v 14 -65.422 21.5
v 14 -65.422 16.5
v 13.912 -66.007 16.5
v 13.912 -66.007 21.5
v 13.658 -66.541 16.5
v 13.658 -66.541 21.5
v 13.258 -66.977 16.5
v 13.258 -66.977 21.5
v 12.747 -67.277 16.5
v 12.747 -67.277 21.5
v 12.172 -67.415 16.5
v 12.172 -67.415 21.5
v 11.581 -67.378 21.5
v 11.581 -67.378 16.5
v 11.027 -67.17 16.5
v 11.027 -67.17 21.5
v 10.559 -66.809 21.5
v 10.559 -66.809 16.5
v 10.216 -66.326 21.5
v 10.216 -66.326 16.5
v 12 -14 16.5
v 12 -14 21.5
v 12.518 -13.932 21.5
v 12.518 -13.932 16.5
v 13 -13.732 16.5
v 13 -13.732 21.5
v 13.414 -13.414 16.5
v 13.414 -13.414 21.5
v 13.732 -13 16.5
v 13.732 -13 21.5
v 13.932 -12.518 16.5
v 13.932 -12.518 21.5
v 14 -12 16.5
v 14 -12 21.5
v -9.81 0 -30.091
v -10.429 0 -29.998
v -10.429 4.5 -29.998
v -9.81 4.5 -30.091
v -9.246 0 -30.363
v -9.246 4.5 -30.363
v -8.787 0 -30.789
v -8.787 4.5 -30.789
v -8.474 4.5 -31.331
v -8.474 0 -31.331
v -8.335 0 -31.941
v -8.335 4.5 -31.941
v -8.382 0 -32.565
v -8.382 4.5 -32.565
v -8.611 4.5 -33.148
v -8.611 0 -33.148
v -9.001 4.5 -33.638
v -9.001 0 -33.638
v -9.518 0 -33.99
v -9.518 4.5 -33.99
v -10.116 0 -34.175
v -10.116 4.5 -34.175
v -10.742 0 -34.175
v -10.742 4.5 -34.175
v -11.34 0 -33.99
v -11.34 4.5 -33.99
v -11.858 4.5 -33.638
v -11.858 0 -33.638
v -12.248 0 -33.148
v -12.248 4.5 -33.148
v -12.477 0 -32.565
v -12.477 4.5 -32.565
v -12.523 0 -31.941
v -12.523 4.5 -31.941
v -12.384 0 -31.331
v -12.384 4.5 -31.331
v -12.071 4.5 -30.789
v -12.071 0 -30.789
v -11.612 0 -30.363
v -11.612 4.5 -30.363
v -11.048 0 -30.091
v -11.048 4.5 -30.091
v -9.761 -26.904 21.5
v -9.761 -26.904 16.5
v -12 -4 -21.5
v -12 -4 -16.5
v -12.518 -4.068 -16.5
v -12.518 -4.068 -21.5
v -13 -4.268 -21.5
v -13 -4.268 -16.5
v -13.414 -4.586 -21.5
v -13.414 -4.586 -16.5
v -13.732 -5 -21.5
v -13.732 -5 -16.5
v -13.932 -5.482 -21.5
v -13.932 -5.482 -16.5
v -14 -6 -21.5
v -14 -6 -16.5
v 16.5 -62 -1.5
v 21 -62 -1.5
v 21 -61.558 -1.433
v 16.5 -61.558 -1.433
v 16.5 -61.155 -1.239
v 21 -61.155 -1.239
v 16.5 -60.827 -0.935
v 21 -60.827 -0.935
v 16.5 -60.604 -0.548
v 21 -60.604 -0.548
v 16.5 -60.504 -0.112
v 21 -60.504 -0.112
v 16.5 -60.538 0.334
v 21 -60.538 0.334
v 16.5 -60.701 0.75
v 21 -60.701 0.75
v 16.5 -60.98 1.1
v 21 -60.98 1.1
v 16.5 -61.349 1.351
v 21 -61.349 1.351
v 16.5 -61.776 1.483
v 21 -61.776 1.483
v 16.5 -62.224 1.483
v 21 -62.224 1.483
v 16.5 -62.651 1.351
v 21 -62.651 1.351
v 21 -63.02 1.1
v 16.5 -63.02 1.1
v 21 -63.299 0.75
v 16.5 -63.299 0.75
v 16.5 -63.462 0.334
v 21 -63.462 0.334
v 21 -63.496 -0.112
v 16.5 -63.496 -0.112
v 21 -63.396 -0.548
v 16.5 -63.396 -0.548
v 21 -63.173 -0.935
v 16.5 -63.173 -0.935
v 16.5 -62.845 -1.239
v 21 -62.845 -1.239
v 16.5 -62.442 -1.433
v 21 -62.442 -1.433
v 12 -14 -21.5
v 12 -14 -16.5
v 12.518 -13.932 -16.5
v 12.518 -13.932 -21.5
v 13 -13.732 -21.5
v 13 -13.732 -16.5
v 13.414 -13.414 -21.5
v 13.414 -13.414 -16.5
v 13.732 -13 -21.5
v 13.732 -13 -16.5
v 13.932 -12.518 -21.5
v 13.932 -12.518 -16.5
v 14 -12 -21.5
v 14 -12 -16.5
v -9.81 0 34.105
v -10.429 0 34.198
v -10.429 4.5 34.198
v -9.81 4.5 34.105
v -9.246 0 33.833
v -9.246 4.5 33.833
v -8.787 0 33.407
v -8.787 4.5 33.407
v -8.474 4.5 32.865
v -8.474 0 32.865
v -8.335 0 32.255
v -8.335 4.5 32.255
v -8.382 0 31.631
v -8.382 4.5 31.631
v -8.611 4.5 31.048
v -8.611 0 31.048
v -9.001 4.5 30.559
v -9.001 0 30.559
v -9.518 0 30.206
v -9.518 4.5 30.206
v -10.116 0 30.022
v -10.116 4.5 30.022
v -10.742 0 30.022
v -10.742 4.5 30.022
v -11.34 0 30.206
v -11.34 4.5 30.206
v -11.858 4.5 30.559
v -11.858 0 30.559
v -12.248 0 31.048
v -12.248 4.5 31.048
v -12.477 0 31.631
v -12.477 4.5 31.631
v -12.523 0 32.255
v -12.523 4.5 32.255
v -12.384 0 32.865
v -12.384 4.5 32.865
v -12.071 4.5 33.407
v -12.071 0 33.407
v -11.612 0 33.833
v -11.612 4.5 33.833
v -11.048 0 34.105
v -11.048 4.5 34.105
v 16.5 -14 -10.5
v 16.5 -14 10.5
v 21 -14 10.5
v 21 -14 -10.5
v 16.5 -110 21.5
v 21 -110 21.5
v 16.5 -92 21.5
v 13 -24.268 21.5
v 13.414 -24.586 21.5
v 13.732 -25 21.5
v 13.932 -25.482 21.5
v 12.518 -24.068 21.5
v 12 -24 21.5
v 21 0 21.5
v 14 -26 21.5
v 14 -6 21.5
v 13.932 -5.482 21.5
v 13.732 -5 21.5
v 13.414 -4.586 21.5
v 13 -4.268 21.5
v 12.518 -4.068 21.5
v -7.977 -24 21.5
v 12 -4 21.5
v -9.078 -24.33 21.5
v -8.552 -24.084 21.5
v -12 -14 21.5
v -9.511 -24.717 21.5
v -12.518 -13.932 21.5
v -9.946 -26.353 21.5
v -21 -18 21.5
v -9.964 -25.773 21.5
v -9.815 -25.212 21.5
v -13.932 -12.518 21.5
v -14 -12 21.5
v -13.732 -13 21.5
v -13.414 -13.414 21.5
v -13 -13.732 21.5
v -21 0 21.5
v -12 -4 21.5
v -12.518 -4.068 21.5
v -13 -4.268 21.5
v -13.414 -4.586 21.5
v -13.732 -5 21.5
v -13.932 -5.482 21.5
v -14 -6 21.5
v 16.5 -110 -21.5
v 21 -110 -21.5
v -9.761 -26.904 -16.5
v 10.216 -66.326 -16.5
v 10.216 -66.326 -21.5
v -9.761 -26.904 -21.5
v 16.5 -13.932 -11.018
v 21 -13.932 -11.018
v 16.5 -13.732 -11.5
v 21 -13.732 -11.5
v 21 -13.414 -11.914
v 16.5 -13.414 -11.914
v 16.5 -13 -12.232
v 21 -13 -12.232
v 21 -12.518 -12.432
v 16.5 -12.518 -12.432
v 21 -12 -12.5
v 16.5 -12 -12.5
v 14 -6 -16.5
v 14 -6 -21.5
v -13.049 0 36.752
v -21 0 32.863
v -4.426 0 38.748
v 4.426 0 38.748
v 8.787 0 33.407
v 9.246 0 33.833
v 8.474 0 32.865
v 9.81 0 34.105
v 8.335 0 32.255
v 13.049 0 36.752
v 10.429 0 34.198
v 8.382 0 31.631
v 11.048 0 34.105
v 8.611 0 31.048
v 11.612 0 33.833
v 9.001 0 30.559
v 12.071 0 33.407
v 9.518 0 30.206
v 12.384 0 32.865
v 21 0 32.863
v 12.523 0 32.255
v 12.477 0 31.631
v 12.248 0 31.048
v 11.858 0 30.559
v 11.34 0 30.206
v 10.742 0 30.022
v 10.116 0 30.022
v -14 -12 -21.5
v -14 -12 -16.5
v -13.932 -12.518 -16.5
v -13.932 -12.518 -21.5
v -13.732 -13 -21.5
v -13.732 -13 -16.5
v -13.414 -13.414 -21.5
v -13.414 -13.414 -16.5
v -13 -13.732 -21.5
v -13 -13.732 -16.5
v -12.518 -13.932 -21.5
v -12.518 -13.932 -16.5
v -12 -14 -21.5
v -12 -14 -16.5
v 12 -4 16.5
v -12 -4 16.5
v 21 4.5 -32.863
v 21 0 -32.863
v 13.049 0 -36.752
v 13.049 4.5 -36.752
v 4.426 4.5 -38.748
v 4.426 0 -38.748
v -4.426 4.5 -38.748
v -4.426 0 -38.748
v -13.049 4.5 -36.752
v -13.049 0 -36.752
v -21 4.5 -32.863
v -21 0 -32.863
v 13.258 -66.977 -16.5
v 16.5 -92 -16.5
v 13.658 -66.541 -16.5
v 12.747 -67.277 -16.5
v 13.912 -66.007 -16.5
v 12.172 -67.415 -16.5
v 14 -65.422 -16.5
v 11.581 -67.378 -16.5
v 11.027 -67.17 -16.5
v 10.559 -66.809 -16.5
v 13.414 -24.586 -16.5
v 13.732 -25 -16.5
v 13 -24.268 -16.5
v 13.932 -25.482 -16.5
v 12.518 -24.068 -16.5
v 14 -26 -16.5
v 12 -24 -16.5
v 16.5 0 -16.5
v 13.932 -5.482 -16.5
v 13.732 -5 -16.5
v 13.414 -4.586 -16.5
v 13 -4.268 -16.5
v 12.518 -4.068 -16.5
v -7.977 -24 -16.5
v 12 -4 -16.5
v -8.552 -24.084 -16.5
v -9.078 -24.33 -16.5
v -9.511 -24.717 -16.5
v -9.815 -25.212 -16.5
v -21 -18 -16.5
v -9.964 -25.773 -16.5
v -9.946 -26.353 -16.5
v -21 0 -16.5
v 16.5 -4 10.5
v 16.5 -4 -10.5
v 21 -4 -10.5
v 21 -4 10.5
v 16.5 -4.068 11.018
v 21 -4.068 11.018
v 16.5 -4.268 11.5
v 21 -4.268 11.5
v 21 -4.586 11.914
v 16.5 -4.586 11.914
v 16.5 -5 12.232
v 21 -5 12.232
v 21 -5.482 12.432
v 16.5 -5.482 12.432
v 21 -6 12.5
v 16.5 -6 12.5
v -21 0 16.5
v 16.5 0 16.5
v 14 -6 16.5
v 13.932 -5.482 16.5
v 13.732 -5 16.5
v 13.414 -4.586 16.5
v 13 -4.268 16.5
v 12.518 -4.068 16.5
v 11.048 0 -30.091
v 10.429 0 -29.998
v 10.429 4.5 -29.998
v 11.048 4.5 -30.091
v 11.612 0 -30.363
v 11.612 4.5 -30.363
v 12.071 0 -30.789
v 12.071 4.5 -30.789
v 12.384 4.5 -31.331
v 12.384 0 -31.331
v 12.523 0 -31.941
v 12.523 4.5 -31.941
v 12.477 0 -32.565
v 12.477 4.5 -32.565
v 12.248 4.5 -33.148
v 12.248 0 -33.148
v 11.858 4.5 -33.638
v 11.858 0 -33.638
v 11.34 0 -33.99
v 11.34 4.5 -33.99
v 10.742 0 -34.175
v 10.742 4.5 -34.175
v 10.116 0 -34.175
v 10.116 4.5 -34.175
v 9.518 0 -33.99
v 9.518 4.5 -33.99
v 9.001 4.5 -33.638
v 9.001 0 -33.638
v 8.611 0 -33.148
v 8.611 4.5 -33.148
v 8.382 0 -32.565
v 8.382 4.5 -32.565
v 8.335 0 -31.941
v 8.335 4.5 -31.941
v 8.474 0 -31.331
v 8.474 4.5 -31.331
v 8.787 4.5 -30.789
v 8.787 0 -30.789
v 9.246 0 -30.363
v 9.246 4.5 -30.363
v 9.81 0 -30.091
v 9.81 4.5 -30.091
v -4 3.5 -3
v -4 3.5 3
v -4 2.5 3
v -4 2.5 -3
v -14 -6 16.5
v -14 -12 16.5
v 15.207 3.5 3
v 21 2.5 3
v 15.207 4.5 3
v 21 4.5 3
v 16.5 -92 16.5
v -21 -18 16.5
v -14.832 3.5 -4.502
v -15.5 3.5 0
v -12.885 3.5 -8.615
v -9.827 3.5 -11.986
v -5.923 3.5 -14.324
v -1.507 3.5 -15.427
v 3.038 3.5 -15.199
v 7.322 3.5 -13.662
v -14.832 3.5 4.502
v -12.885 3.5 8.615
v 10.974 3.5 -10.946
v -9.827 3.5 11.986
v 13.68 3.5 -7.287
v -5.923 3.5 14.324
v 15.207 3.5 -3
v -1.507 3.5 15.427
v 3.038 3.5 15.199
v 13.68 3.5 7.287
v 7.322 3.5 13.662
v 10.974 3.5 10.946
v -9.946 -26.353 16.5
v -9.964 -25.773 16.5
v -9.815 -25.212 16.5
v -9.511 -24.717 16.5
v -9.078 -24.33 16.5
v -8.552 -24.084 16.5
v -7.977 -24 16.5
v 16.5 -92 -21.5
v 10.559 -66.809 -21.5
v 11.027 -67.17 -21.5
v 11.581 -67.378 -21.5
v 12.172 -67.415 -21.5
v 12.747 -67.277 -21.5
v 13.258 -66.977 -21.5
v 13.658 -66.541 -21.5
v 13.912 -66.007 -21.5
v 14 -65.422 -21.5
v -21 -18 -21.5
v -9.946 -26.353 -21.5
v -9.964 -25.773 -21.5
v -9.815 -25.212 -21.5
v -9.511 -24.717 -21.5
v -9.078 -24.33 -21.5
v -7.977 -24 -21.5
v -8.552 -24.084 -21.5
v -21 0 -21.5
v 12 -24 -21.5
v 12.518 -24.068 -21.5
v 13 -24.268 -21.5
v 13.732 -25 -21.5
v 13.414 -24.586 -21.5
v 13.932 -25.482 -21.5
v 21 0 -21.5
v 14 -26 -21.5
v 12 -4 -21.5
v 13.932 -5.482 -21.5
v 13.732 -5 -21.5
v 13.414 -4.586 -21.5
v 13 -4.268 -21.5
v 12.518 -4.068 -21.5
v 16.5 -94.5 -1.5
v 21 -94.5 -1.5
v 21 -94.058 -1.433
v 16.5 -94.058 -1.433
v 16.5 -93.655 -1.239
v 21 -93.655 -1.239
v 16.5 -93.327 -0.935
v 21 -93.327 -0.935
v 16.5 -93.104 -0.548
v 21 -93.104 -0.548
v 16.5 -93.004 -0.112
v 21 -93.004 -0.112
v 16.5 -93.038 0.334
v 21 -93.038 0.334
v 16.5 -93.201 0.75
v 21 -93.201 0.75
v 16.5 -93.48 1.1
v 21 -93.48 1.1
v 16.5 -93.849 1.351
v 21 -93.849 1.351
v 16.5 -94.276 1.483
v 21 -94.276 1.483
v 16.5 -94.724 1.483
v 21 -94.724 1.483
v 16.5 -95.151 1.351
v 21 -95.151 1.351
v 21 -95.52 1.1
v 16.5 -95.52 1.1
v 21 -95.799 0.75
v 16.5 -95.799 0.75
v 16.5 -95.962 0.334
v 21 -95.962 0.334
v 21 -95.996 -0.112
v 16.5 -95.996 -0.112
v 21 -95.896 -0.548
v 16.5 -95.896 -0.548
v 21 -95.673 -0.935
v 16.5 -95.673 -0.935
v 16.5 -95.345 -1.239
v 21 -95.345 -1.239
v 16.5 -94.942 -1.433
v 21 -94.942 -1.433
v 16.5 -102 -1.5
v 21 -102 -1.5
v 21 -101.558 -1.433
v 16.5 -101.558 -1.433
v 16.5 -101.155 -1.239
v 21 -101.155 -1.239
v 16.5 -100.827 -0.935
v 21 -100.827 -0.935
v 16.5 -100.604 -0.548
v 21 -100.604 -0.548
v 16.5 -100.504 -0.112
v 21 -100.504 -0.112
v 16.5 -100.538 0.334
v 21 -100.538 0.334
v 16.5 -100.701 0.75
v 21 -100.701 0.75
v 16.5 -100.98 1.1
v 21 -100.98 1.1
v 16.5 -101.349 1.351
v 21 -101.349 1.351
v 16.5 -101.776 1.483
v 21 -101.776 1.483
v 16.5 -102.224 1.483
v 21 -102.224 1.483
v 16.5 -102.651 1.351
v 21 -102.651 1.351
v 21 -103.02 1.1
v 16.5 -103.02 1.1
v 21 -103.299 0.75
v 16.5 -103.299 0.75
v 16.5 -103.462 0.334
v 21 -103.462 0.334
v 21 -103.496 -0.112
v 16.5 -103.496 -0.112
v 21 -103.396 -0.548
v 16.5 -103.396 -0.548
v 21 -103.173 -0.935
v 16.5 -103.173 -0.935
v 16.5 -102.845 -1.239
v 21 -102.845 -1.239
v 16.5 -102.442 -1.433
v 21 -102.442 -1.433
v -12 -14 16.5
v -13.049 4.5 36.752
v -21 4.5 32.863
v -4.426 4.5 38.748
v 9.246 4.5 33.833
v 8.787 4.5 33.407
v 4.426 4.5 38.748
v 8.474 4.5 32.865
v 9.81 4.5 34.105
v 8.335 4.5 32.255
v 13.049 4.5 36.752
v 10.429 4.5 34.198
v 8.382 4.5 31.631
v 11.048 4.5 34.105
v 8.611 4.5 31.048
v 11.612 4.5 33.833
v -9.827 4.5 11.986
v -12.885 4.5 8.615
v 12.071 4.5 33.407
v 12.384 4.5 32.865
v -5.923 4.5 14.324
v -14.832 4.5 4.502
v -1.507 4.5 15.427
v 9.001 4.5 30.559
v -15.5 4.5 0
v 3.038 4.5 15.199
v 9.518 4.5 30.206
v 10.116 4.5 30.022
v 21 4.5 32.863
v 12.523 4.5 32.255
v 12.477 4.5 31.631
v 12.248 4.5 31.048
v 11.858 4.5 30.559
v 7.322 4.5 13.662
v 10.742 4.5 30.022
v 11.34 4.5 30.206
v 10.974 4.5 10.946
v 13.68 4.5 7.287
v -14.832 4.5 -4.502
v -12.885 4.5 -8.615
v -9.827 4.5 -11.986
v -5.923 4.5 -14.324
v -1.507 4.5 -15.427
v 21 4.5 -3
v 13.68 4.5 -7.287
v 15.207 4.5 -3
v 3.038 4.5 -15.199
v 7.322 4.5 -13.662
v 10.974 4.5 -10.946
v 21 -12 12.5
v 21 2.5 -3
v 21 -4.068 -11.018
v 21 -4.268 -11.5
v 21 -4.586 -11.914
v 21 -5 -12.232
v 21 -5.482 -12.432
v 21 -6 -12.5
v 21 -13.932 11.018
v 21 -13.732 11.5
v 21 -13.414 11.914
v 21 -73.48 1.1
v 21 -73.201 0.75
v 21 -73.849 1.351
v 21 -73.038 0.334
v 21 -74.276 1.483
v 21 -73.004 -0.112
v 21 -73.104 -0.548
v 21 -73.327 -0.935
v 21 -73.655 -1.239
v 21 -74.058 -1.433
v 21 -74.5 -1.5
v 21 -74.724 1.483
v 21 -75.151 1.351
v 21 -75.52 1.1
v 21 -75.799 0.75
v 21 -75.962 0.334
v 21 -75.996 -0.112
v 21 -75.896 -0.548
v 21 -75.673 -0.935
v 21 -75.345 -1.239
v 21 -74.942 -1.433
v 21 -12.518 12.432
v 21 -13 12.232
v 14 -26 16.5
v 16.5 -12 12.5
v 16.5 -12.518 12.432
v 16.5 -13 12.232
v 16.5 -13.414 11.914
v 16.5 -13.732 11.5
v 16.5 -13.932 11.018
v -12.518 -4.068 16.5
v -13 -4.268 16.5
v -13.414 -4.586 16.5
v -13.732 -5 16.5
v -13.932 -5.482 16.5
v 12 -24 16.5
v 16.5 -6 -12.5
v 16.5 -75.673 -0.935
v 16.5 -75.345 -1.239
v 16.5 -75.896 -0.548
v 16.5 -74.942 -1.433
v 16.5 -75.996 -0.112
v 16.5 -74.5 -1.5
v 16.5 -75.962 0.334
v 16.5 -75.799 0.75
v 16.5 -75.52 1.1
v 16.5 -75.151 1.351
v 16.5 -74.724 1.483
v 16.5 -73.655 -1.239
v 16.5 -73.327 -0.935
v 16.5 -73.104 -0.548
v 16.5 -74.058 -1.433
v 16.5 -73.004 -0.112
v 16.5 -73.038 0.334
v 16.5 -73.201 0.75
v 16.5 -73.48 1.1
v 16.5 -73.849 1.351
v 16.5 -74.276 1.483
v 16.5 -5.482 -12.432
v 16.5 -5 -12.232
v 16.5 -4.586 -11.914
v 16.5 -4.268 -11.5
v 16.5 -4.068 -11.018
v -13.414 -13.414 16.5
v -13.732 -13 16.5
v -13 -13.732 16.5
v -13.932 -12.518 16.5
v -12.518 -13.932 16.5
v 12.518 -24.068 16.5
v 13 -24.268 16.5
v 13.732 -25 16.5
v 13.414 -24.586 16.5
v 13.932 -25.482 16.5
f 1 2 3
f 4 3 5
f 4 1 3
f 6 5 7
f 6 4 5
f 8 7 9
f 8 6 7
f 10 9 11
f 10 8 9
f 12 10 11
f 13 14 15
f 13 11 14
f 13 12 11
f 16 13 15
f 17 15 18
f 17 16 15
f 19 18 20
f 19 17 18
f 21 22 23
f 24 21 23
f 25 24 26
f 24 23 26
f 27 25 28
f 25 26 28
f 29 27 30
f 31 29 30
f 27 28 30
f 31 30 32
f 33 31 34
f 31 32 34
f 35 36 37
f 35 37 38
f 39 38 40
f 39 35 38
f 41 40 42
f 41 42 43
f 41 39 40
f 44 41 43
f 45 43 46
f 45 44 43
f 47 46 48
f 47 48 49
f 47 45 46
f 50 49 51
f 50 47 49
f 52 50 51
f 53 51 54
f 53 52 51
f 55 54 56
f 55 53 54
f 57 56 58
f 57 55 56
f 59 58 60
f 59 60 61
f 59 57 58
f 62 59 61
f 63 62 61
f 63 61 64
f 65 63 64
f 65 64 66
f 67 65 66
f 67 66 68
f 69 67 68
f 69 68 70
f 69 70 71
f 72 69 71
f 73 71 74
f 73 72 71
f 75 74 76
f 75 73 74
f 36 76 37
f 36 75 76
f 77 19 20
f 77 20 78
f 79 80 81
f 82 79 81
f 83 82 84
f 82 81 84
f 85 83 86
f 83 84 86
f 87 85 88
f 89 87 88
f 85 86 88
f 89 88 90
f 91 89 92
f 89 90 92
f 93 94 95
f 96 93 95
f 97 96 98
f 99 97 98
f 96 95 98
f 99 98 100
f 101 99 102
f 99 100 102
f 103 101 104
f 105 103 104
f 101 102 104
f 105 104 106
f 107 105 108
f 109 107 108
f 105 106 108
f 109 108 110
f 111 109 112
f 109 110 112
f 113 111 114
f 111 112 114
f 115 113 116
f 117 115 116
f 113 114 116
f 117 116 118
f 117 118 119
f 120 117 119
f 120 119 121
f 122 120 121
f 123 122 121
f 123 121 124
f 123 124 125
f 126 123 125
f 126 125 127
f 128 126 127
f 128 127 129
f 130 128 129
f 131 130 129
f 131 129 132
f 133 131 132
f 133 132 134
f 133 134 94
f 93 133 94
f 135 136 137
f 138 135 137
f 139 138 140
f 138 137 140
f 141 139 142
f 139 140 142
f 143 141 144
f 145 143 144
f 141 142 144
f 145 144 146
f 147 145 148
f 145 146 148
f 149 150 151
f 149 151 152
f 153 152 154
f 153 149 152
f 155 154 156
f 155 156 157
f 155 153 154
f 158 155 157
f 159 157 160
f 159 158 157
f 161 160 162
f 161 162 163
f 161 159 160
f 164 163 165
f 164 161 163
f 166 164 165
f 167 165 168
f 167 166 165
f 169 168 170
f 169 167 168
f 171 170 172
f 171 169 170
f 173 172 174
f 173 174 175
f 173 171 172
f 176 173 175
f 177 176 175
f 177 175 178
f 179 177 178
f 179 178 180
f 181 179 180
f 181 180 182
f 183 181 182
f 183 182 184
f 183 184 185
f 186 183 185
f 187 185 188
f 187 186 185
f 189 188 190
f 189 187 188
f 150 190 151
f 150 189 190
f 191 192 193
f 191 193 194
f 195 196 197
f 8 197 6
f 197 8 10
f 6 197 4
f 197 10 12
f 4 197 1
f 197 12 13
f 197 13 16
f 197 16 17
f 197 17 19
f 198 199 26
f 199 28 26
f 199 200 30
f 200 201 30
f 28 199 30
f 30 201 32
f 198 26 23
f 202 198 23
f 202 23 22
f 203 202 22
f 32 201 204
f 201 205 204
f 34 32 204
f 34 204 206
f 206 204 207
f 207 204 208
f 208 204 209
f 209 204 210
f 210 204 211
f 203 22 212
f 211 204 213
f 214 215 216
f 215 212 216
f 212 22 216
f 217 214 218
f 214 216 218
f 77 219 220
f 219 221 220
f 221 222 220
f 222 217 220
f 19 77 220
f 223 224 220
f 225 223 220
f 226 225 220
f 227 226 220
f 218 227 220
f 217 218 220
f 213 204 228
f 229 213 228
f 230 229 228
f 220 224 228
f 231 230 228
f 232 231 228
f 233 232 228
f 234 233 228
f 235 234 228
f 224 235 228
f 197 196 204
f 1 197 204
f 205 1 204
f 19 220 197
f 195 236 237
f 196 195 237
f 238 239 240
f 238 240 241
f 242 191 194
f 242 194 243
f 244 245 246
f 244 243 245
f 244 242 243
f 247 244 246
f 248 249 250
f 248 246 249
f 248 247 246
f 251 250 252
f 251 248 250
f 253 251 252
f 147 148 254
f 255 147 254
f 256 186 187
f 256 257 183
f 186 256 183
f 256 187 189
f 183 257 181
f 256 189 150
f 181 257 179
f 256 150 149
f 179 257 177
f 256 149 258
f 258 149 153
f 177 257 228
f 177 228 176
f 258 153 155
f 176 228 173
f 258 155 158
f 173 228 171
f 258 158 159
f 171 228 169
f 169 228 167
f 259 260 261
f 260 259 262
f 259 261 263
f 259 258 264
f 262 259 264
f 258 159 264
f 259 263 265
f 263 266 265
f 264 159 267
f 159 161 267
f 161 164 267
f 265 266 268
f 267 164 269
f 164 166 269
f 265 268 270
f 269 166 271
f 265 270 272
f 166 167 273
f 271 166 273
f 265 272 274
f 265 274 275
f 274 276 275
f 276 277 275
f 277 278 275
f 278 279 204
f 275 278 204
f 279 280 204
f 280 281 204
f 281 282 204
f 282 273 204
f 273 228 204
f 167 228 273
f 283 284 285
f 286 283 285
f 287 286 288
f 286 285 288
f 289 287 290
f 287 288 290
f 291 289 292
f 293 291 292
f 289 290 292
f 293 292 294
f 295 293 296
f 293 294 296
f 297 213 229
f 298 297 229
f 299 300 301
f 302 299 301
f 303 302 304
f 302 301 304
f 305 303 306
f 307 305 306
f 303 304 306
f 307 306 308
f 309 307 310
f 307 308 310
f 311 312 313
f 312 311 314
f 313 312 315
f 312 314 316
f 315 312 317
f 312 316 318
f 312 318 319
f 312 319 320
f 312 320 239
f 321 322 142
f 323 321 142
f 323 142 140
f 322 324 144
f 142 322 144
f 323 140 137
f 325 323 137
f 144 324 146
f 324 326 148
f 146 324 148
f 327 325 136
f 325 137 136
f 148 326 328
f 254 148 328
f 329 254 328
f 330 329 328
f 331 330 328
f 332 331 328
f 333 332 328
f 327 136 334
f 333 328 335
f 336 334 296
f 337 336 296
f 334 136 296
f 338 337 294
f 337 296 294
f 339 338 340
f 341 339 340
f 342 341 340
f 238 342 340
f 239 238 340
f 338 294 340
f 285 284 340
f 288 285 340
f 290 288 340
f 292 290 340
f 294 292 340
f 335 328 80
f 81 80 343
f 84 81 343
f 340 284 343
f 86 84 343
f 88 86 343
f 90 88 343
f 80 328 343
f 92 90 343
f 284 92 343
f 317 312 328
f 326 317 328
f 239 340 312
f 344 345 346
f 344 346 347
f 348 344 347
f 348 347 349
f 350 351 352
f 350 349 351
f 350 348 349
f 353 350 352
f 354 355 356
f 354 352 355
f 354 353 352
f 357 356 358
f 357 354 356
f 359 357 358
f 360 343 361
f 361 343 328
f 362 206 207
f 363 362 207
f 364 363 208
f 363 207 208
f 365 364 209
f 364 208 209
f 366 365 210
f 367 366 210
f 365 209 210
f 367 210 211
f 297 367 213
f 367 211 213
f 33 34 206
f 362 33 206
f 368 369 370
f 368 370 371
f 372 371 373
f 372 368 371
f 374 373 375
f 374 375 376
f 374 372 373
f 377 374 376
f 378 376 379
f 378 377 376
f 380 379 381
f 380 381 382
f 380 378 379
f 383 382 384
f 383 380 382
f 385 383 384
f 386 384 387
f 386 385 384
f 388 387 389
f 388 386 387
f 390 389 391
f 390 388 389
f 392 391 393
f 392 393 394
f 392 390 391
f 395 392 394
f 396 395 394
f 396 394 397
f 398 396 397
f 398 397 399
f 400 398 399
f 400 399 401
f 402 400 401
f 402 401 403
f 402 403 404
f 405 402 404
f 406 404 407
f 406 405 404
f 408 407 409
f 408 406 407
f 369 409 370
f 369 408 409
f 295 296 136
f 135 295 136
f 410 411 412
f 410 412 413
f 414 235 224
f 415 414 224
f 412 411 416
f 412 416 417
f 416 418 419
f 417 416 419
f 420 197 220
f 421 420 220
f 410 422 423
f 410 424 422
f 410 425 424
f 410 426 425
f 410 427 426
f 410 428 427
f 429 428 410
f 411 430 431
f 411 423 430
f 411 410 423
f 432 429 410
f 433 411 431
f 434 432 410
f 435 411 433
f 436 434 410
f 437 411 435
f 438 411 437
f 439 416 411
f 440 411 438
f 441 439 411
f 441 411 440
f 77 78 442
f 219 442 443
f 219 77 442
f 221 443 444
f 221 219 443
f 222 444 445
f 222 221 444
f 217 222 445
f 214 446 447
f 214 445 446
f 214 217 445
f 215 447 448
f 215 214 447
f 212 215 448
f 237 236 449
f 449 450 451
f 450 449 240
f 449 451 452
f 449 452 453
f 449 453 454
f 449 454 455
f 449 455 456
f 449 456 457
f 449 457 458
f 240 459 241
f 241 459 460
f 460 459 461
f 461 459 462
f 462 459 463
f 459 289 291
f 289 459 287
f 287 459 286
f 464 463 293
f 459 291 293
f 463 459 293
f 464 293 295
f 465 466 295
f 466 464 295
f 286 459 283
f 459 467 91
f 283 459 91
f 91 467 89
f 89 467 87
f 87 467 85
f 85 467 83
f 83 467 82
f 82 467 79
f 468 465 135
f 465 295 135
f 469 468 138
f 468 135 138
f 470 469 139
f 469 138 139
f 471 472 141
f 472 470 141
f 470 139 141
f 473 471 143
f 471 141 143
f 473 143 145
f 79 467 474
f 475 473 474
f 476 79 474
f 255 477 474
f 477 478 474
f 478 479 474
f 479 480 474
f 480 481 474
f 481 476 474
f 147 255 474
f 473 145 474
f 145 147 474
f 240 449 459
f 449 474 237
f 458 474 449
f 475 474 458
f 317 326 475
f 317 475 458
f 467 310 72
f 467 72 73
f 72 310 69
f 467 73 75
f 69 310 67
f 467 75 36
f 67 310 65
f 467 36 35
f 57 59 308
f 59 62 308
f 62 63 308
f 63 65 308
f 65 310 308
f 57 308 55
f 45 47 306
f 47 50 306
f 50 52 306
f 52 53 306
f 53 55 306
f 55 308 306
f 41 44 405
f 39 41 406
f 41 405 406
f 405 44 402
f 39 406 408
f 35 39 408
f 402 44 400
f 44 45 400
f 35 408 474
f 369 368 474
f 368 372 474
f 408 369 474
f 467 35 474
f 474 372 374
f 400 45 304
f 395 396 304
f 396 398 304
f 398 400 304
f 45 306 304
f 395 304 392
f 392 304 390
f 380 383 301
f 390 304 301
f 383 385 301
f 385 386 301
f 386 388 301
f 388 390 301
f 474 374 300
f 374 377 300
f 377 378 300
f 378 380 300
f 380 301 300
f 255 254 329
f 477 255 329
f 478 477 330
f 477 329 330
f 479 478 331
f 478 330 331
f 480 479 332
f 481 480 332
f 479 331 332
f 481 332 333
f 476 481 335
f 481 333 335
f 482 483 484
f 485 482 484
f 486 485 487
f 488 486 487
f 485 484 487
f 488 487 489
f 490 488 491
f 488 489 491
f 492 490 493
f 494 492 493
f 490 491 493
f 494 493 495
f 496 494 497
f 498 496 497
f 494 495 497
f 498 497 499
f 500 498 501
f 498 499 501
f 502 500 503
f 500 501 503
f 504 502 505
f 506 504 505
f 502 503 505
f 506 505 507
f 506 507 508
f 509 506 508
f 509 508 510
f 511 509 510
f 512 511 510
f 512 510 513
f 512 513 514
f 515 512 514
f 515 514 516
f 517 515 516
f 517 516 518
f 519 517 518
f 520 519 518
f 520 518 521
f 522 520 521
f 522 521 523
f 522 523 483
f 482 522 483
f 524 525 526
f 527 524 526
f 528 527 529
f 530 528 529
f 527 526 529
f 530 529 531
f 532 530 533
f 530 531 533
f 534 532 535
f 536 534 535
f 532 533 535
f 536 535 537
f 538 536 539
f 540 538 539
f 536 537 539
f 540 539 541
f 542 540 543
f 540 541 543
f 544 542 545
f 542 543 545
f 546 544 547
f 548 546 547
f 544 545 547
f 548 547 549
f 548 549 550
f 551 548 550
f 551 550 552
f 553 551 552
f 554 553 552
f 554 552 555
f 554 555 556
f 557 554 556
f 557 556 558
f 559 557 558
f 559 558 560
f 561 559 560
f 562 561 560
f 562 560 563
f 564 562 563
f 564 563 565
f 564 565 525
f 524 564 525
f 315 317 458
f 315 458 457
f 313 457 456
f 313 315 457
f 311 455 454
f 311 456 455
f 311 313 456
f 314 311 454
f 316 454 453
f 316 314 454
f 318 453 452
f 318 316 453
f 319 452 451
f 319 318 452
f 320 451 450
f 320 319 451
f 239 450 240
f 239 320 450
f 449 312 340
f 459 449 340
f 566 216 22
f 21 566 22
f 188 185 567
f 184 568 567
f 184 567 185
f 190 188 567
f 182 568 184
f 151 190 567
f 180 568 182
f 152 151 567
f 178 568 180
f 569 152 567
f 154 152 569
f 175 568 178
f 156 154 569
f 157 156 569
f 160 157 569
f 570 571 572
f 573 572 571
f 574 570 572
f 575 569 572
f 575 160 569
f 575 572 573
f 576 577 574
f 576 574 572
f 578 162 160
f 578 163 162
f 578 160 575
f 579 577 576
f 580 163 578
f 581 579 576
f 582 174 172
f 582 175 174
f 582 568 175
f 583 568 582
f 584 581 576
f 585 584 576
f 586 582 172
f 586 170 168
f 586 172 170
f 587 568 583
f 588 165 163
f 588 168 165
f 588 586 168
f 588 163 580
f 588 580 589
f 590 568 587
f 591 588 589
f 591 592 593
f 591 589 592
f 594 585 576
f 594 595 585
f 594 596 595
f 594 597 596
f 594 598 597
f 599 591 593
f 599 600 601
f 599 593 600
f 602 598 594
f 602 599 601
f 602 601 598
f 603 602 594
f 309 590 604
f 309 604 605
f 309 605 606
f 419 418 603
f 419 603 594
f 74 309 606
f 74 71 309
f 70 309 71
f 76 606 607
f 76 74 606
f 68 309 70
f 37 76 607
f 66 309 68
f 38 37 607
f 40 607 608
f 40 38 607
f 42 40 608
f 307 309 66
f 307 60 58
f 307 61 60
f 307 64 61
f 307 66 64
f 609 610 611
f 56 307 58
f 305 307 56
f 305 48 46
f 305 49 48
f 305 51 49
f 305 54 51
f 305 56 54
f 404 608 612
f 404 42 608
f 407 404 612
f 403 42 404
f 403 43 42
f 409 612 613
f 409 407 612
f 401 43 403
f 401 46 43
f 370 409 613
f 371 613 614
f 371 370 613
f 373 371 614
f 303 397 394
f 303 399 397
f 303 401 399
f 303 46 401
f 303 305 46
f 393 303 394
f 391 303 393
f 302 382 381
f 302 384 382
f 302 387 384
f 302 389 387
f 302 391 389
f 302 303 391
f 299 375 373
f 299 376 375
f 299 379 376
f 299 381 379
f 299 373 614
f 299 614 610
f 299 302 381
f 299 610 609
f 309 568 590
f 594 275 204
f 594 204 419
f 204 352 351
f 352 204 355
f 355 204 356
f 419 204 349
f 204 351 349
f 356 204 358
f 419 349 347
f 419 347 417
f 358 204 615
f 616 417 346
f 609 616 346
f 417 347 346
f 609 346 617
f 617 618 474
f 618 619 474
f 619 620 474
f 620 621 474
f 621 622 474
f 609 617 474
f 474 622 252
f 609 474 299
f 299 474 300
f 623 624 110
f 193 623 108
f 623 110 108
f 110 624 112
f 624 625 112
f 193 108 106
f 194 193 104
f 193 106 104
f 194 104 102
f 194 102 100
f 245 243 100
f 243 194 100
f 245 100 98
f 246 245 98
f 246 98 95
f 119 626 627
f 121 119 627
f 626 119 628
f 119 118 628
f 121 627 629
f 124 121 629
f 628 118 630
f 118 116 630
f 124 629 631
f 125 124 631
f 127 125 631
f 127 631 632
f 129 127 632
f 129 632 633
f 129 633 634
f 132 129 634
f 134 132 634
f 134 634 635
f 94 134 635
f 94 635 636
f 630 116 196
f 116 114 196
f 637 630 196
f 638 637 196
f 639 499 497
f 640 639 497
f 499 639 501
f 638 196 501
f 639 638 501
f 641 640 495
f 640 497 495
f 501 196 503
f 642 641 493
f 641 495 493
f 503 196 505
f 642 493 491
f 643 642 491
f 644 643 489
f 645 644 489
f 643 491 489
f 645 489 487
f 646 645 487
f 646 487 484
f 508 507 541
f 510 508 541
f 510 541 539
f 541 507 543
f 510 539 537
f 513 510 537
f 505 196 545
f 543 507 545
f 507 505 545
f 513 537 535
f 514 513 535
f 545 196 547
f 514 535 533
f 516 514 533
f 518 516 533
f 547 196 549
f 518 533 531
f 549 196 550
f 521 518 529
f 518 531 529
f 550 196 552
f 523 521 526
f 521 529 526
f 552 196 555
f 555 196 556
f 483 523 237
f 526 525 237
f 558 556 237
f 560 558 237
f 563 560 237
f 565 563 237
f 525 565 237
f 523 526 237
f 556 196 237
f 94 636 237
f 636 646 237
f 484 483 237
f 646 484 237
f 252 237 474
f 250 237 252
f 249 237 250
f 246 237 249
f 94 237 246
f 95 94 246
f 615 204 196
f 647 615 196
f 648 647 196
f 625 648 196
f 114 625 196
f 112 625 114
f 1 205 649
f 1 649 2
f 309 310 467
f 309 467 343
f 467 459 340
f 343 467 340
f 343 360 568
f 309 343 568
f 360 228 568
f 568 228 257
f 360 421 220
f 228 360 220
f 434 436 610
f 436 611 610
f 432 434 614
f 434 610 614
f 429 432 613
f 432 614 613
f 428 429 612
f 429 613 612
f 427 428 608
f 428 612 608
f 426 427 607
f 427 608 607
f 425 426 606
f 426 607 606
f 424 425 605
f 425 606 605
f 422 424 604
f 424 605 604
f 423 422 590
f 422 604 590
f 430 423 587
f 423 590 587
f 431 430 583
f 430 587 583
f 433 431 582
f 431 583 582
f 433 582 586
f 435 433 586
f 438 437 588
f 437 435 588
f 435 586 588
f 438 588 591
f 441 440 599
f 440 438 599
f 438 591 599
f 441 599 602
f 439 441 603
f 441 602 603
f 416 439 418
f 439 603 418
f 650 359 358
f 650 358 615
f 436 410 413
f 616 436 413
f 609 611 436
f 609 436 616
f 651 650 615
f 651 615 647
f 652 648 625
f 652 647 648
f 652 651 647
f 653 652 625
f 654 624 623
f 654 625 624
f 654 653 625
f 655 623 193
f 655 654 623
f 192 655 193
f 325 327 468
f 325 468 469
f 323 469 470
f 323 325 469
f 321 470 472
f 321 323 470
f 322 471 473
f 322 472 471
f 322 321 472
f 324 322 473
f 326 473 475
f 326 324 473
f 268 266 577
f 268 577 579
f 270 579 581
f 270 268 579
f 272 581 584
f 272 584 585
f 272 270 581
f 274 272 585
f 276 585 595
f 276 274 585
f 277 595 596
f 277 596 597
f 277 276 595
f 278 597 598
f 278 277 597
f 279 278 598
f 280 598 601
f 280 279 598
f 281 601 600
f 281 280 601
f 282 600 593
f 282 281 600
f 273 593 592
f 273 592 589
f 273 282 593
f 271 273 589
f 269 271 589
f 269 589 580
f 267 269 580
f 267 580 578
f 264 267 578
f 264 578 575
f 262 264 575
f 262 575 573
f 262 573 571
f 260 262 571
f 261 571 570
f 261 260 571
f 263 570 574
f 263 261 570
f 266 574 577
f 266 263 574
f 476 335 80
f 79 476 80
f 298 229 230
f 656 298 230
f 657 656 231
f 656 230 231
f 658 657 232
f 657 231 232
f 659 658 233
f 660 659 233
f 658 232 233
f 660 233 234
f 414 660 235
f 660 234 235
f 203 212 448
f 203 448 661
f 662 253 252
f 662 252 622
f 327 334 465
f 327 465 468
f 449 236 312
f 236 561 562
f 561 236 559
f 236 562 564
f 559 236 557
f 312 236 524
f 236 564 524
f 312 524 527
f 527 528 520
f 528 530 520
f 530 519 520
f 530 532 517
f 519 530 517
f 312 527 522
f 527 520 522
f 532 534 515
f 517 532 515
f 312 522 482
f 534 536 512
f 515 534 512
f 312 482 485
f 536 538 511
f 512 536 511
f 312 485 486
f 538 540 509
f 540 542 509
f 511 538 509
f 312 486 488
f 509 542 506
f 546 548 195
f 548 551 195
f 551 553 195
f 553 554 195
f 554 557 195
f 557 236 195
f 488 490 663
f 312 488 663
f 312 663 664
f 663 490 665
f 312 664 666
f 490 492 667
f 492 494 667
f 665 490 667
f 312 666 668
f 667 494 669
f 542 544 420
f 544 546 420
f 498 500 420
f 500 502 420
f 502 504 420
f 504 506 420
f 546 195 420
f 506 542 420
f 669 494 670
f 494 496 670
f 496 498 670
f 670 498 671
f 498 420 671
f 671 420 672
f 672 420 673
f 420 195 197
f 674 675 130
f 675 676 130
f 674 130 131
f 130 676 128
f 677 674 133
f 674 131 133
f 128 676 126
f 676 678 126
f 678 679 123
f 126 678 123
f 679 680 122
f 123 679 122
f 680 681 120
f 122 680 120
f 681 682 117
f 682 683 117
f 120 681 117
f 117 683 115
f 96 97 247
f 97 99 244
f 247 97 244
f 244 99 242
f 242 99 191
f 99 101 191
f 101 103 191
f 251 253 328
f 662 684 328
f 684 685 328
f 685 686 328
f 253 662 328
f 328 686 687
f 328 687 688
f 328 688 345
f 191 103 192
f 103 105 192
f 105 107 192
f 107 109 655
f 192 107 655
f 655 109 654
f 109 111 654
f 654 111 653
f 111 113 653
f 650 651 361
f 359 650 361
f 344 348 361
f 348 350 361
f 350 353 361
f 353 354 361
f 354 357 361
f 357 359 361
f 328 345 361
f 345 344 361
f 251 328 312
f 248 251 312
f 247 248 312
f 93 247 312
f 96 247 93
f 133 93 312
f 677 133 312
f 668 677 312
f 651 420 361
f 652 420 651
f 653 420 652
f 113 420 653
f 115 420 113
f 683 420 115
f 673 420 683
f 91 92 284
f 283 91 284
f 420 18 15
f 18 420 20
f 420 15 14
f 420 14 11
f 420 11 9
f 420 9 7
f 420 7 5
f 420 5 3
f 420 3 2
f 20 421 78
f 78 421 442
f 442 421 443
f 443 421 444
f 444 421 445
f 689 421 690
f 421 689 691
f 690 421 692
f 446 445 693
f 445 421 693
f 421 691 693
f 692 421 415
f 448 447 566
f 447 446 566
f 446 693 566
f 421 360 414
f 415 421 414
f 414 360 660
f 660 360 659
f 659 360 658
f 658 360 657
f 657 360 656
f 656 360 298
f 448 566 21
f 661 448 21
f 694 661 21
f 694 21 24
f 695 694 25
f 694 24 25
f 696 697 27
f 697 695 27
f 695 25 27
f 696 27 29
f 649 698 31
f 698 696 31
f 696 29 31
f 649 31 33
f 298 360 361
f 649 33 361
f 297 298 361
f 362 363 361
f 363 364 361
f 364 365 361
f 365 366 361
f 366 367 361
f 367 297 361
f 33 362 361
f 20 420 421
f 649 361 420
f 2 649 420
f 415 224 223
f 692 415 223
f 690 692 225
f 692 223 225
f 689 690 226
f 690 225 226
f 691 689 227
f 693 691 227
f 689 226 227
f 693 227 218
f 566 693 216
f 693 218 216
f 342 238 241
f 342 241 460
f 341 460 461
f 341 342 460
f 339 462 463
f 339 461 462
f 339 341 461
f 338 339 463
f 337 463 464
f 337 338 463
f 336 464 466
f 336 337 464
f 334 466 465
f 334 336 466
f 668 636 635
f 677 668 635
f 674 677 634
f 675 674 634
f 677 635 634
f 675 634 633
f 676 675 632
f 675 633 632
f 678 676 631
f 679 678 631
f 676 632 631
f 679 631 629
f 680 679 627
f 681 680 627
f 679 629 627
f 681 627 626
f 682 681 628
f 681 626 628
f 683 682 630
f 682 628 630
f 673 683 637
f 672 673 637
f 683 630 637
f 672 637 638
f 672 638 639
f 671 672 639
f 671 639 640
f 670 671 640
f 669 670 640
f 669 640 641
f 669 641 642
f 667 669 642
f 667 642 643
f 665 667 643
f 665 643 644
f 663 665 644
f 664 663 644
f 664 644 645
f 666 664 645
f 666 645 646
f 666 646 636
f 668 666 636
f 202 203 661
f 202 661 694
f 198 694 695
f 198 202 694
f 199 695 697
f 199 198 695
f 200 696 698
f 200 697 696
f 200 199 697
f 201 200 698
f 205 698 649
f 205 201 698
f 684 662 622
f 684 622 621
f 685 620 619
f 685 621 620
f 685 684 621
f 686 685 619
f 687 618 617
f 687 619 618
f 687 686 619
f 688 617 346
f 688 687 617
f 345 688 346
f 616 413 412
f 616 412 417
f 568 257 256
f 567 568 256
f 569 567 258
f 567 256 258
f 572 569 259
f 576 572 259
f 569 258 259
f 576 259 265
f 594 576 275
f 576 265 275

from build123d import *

# Parameters (mm, degrees)
SKETCH1_R           = 2.1
BOSS_EXTRUDE1_DEPTH = 4.5
SKETCH2_R           = 15.5
CUT_EXTRUDE1_DEPTH  = 1
SKETCH3_W           = 25
SKETCH3_H           = 6
CUT_EXTRUDE2_DEPTH  = 2
BOSS_EXTRUDE2_DEPTH = 110
CUT_EXTRUDE3_DEPTH  = 128.284130983
CUT_EXTRUDE4_REACH  = 126.036
SKETCH6_R           = 1.5
CUT_EXTRUDE5_REACH  = 124.586
CUT_EXTRUDE6_DEPTH  = 110


with BuildPart() as part:
    # Sketch1 → Boss-Extrude1 (new body)
    with BuildSketch(Plane(origin=(0, 0, 0), x_dir=(1, 0, 0), z_dir=(0, 1, 0))):
        with BuildLine():
            Line((-21, 32.86335345), (-21, -32.86335345))
            ThreePointArc((-21, -32.86335345), (0, -39), (21, -32.86335345))
            Line((21, -32.86335345), (21, 32.86335345))
            ThreePointArc((21, 32.86335345), (0, 39), (-21, 32.86335345))
        make_face()
        with Locations(Location((10.42932356, 32.098157425, 0), (0, 0, 270))):
            Circle(SKETCH1_R, mode=Mode.SUBTRACT)
        with Locations(Location((-10.42932356, 32.098157425, 0), (0, 0, 270))):
            Circle(SKETCH1_R, mode=Mode.SUBTRACT)
        with Locations(Location((10.42932356, -32.098157425, 0), (0, 0, 270))):
            Circle(SKETCH1_R, mode=Mode.SUBTRACT)
        with Locations(Location((-10.42932356, -32.098157425, 0), (0, 0, 270))):
            Circle(SKETCH1_R, mode=Mode.SUBTRACT)
    extrude(amount=BOSS_EXTRUDE1_DEPTH)

    # Sketch2 → Cut-Extrude1 (cut)
    with BuildSketch(Plane(origin=(0, 4.5, 0), x_dir=(1, 0, 0), z_dir=(0, 1, 0))):
        with Locations(Location((0, 0, 0), (0, 0, 270))):
            Circle(SKETCH2_R)
    extrude(amount=-CUT_EXTRUDE1_DEPTH, mode=Mode.SUBTRACT)

    # Sketch3 → Cut-Extrude2 (cut)
    with BuildSketch(Plane(origin=(0, 4.5, 0), x_dir=(1, 0, 0), z_dir=(0, 1, 0))):
        with Locations((8.5, 0)):
            Rectangle(SKETCH3_W, SKETCH3_H)
    extrude(amount=-CUT_EXTRUDE2_DEPTH, mode=Mode.SUBTRACT)

    # Sketch4 → Boss-Extrude2 (add)
    with BuildSketch(Plane.XZ):
        Polygon((21, 21.5), (-21, 21.5), (-21, 16.5), (-16.5, 16.5), (16.5, 16.5), (16.5, -16.5), (-16.5, -16.5), (-21, -16.5), (-21, -21.5), (21, -21.5), align=None)
    extrude(amount=BOSS_EXTRUDE2_DEPTH)

    # Sketch5 → Cut-Extrude3 (cut, through all)
    with BuildSketch(Plane.XY.offset(21.5)):
        Polygon((-21, -18), (16.5, -110), (16.5, -92), align=None)
    extrude(amount=-CUT_EXTRUDE3_DEPTH, mode=Mode.SUBTRACT)


with BuildPart() as cut_extrude3_kept_piece:
    # of the separate pieces the step leaves, the one the design keeps (cut_extrude3_pieces_kept)
    add(part.part.solids().sort_by_distance((21, 0, -32.86335345))[0])

    # Sketch6 → Cut-Extrude4 (cut, up to next)
    with BuildSketch(Plane(origin=(21, 0, 0), x_dir=(0, 0, -1), z_dir=(1, 0, 0)), mode=Mode.PRIVATE) as cut_extrude4_sk1:
        with Locations((0, -102)):
            Circle(SKETCH6_R)
    cut_extrude4_tool1 = extrude(cut_extrude4_sk1.sketch, amount=-CUT_EXTRUDE4_REACH, mode=Mode.PRIVATE) & cut_extrude3_kept_piece.part
    # Sketch6 → Cut-Extrude4 (cut, up to next)
    with BuildSketch(Plane(origin=(21, 0, 0), x_dir=(0, 0, -1), z_dir=(1, 0, 0)), mode=Mode.PRIVATE) as cut_extrude4_sk2:
        with Locations((0, -94.5)):
            Circle(SKETCH6_R)
    cut_extrude4_tool2 = extrude(cut_extrude4_sk2.sketch, amount=-CUT_EXTRUDE4_REACH, mode=Mode.PRIVATE) & cut_extrude3_kept_piece.part
    # Sketch6 → Cut-Extrude4 (cut, up to next)
    with BuildSketch(Plane(origin=(21, 0, 0), x_dir=(0, 0, -1), z_dir=(1, 0, 0)), mode=Mode.PRIVATE) as cut_extrude4_sk3:
        with Locations((0, -74.5)):
            Circle(SKETCH6_R)
    cut_extrude4_tool3 = extrude(cut_extrude4_sk3.sketch, amount=-CUT_EXTRUDE4_REACH, mode=Mode.PRIVATE) & cut_extrude3_kept_piece.part
    # Sketch6 → Cut-Extrude4 (cut, up to next)
    with BuildSketch(Plane(origin=(21, 0, 0), x_dir=(0, 0, -1), z_dir=(1, 0, 0)), mode=Mode.PRIVATE) as cut_extrude4_sk4:
        with Locations((0, -62)):
            Circle(SKETCH6_R)
    cut_extrude4_tool4 = extrude(cut_extrude4_sk4.sketch, amount=-CUT_EXTRUDE4_REACH, mode=Mode.PRIVATE) & cut_extrude3_kept_piece.part
    add(cut_extrude4_tool1.solids().sort_by_distance((21, -102, 0))[0], mode=Mode.SUBTRACT)
    add(cut_extrude4_tool2.solids().sort_by_distance((21, -94.5, 0))[0], mode=Mode.SUBTRACT)
    add(cut_extrude4_tool3.solids().sort_by_distance((21, -74.5, 0))[0], mode=Mode.SUBTRACT)
    add(cut_extrude4_tool4.solids().sort_by_distance((21, -62, 0))[0], mode=Mode.SUBTRACT)

    # Sketch7 → Cut-Extrude5 (cut, up to next)
    with BuildSketch(Plane.ZY.offset(-16.5), mode=Mode.PRIVATE) as cut_extrude5_sk1:
        with BuildLine():
            Line((-10.5, -4), (10.5, -4))
            ThreePointArc((10.5, -4), (11.914213562, -4.585786438), (12.5, -6))
            Line((12.5, -6), (12.5, -12))
            ThreePointArc((12.5, -12), (11.914213562, -13.414213562), (10.5, -14))
            Line((10.5, -14), (-10.5, -14))
            ThreePointArc((-10.5, -14), (-11.914213562, -13.414213562), (-12.5, -12))
            Line((-12.5, -12), (-12.5, -6))
            ThreePointArc((-12.5, -6), (-11.914213562, -4.585786438), (-10.5, -4))
        make_face()
    cut_extrude5_tool1 = extrude(cut_extrude5_sk1.sketch, amount=-CUT_EXTRUDE5_REACH, mode=Mode.PRIVATE) & cut_extrude3_kept_piece.part
    add(cut_extrude5_tool1.solids().sort_by_distance((16.5, -9, 0))[0], mode=Mode.SUBTRACT)

    # Sketch8 → Cut-Extrude6 (cut)
    with BuildSketch(Plane.XY.offset(21.5)):
        with BuildLine():
            Line((-7.977370013, -24), (12, -24))
            ThreePointArc((12, -24), (13.414213562, -24.585786438), (14, -26))
            Line((14, -26), (14, -65.422010158))
            ThreePointArc((14, -65.422010158), (12.46475074, -67.36726252), (10.21599325, -66.326067633))
            Line((10.21599325, -66.326067633), (-9.761376762, -26.904057474))
            ThreePointArc((-9.761376762, -26.904057474), (-9.681499548, -24.953127264), (-7.977370013, -24))
        make_face()
        with BuildLine():
            Line((-12, -14), (12, -14))
            ThreePointArc((12, -14), (13.414213562, -13.414213562), (14, -12))
            Line((14, -12), (14, -6))
            ThreePointArc((14, -6), (13.414213562, -4.585786438), (12, -4))
            Line((12, -4), (-12, -4))
            ThreePointArc((-12, -4), (-13.414213562, -4.585786438), (-14, -6))
            Line((-14, -6), (-14, -12))
            ThreePointArc((-14, -12), (-13.414213562, -13.414213562), (-12, -14))
        make_face()
    extrude(amount=-CUT_EXTRUDE6_DEPTH, mode=Mode.SUBTRACT)


solid = cut_extrude3_kept_piece.part
